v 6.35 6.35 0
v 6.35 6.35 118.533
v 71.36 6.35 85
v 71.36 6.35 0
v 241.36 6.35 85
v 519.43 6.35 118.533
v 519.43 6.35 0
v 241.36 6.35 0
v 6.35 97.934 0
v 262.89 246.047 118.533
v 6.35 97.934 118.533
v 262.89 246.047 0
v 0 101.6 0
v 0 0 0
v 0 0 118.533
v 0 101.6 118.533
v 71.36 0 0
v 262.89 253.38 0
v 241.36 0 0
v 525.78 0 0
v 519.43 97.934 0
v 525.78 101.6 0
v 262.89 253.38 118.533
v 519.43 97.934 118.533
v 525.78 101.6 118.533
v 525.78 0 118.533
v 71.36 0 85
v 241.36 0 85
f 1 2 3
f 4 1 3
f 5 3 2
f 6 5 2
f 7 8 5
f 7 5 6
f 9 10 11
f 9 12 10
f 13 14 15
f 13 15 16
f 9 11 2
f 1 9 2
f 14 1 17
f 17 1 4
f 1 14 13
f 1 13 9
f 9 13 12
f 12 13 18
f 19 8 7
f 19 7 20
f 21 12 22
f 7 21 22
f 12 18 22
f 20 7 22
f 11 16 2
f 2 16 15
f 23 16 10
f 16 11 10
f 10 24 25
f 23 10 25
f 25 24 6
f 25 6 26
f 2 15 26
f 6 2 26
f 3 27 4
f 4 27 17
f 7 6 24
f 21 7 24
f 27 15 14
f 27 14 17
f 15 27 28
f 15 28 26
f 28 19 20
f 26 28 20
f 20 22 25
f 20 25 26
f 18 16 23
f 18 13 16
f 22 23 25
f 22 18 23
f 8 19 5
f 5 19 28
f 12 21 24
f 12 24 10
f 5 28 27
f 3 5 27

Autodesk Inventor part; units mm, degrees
ref_plane "YZ Plane" through (0, 0, 0) normal (1, 0, 0) x (0, 1, 0)
ref_plane "XZ Plane" through (0, 0, 0) normal (0, 1, 0) x (-1, 0, 0)
ref_plane "XY Plane" through (0, 0, 0) normal (0, 0, 1) x (1, 0, 0)
sketch "Sketch1" plane through (0, 0, 0) normal (0, 0, 1) x (1, 0, 0)
  line L0 (0, 0) -> (525.78, 0)
  line L1 (0, 0) -> (0, 101.6)
  line L2 (0, 101.6) -> (262.89, 253.3796)
  line L3 (262.89, 253.3796) -> (525.78, 101.6)
  line L4 (525.78, 101.6) -> (525.78, 0)
  line L5 (262.89, 246.0473) -> (6.35, 97.9338)
  line L6 (6.35, 97.9338) -> (6.35, 6.35)
  line L7 (6.35, 6.35) -> (519.43, 6.35)
  line L8 (519.43, 6.35) -> (519.43, 97.9338)
  line L9 (519.43, 97.9338) -> (262.89, 246.0473)
  point P0 (262.89, 0)
  dimension "d0" = 525.78
  dimension "d1" = 101.6
  dimension "d2" = 120
  dimension "d3" = 6.35
extrude "Extrusion1" add sketch "Sketch1" along normal blind 355.6
sketch "Sketch2" plane through (0, 0, 355.6) normal (0, 0, 1) x (1, 0, 0)
  line L0 (262.89, 246.0473) -> (519.43, 97.9338) projected
  line L1 (519.43, 97.9338) -> (519.43, 6.35) projected
  line L2 (519.43, 6.35) -> (6.35, 6.35) projected
  line L3 (6.35, 6.35) -> (6.35, 97.9338) projected
  line L4 (6.35, 97.9338) -> (262.89, 246.0473) projected
  line L5 (0, 0) -> (525.78, 0) projected
  line L6 (525.78, 0) -> (525.78, 101.6) projected
  line L7 (525.78, 101.6) -> (262.89, 253.3796) projected
  line L8 (262.89, 253.3796) -> (0, 101.6) projected
  line L9 (0, 101.6) -> (0, 0) projected
  circle A0 centre (262.89, 121.3796) radius 60
  dimension "d6" = 120
  dimension "d7" = 132
extrude "Extrusion2" add sketch "Sketch2" along normal blind 6.35 contours L0 L1 L2 L3 L4 | L9 L8 L7 L6 L5
sketch "Sketch3" plane through (0, 0, 0) normal (0, -1, 0) x (1, 0, 0)
  line L0 (0, 0) -> (525.78, 0) construction
  line L1 (525.78, 0) -> (525.78, 88.9)
  line L2 (525.78, 88.9) -> (0, 88.9) construction
  line L3 (0, 88.9) -> (0, 0) construction
  line L4 (86.36, 21.95) -> (86.36, 66.95) construction
  circle A0 centre (86.36, 44.45) radius 2.3812
  circle A1 centre (86.36, 21.95) radius 2.3812
  circle A2 centre (86.36, 66.95) radius 2.3812
  line L5 (146.36, 49.45) -> (146.36, 29.45) construction
  line L6 (156.36, 66.95) -> (156.36, 21.95) construction
  line L7 (146.36, 29.45) -> (166.36, 29.45) construction
  line L8 (166.36, 49.45) -> (146.36, 49.45) construction
  line L9 (86.36, 66.95) -> (226.36, 66.95) construction
  line L10 (226.36, 21.95) -> (86.36, 21.95) construction
  line L11 (86.36, 44.45) -> (226.36, 44.45) construction
  line L12 (166.36, 29.45) -> (166.36, 49.45) construction
  line L13 (226.36, 66.95) -> (226.36, 21.95) construction
  circle A3 centre (226.36, 66.95) radius 2.3813
  circle A4 centre (226.36, 44.45) radius 2.3813
  circle A5 centre (226.36, 21.95) radius 2.3813
  circle A6 centre (156.36, 39.45) radius 10
  line L14 (0, 0) -> (0, 361.95) projected
  line L15 (525.78, 0) -> (525.78, 361.95) projected
  line L16 (0, 0) -> (525.78, 0) projected
  point P0 (0, 44.45)
  point P1 (146.36, 39.45)
  point P2 (166.36, 39.45)
  point P3 (262.89, 0)
  dimension "d10" = 45
  dimension "d11" = 140
  dimension "d12" = 4.7625
  dimension "d13" = 4.7625
  dimension "d14" = 4.7625
  dimension "d15" = 4.7625
  dimension "d16" = 4.7625
  dimension "d17" = 4.7625
  dimension "d18" = 60
  dimension "d19" = 7.5
  dimension "d20" = 20
  dimension "d21" = 20
  dimension "d22" = 86.36
  dimension "d23" = 88.9
extrude "Extrusion3" cut sketch "Sketch3" against normal blind 6.35
sketch "Sketch4" plane through (0, 0, 0) normal (0, -1, 0) x (1, 0, 0)
  line L0 (71.36, 0) -> (241.36, 0)
  line L1 (241.36, 0) -> (241.36, 85)
  line L2 (241.36, 85) -> (71.36, 85)
  line L3 (71.36, 85) -> (71.36, 0)
  line L4 (0, 0) -> (525.78, 0) construction
  circle A0 centre (156.36, 39.45) radius 10 construction
  point P0 (156.36, 85)
  dimension "d26" = 170
  dimension "d27" = 85
extrude "Extrusion4" cut sketch "Sketch4" against normal blind 6.35
sketch "Sketch5" plane through (0, 0, 361.95) normal (0, -1, 0) x (1, 0, 0)
  line L0 (519.43, -6.35) -> (6.35, -6.35) projected
  line L1 (241.36, -361.95) -> (525.78, -361.95) projected
  line L2 (0, -361.95) -> (0, 0) projected
  line L3 (525.78, -361.95) -> (0, -361.95)
  line L4 (0, -361.95) -> (0, -243.4167)
  line L5 (0, -243.4167) -> (525.78, -243.4167)
  line L6 (525.78, -243.4167) -> (525.78, -361.95)
  line L7 (525.78, -243.4167) -> (0, -243.4167)
  line L8 (0, -243.4167) -> (0, -124.8833)
  line L9 (0, -124.8833) -> (525.78, -124.8833)
  line L10 (525.78, -124.8833) -> (525.78, -243.4167)
  line L11 (525.78, -124.8833) -> (0, -124.8833)
  line L12 (0, -124.8833) -> (0, 0)
  line L13 (0, 0) -> (525.78, 0)
  line L14 (525.78, 0) -> (525.78, -124.8833)
  dimension "d30" = 355.6
  dimension "d31" = 118.5333
  dimension "d32" = 118.5333
extrude "Extrusion5" cut sketch "Sketch5" against normal through all contours L5 L2 L9 L10 | L9 L2 L13 L14
equation "\"d31\" = 0.333333 * d30"
equation "\"d32\" = 0.333333 * d30"
properties part number "CA01" material "ABS Plastic"
